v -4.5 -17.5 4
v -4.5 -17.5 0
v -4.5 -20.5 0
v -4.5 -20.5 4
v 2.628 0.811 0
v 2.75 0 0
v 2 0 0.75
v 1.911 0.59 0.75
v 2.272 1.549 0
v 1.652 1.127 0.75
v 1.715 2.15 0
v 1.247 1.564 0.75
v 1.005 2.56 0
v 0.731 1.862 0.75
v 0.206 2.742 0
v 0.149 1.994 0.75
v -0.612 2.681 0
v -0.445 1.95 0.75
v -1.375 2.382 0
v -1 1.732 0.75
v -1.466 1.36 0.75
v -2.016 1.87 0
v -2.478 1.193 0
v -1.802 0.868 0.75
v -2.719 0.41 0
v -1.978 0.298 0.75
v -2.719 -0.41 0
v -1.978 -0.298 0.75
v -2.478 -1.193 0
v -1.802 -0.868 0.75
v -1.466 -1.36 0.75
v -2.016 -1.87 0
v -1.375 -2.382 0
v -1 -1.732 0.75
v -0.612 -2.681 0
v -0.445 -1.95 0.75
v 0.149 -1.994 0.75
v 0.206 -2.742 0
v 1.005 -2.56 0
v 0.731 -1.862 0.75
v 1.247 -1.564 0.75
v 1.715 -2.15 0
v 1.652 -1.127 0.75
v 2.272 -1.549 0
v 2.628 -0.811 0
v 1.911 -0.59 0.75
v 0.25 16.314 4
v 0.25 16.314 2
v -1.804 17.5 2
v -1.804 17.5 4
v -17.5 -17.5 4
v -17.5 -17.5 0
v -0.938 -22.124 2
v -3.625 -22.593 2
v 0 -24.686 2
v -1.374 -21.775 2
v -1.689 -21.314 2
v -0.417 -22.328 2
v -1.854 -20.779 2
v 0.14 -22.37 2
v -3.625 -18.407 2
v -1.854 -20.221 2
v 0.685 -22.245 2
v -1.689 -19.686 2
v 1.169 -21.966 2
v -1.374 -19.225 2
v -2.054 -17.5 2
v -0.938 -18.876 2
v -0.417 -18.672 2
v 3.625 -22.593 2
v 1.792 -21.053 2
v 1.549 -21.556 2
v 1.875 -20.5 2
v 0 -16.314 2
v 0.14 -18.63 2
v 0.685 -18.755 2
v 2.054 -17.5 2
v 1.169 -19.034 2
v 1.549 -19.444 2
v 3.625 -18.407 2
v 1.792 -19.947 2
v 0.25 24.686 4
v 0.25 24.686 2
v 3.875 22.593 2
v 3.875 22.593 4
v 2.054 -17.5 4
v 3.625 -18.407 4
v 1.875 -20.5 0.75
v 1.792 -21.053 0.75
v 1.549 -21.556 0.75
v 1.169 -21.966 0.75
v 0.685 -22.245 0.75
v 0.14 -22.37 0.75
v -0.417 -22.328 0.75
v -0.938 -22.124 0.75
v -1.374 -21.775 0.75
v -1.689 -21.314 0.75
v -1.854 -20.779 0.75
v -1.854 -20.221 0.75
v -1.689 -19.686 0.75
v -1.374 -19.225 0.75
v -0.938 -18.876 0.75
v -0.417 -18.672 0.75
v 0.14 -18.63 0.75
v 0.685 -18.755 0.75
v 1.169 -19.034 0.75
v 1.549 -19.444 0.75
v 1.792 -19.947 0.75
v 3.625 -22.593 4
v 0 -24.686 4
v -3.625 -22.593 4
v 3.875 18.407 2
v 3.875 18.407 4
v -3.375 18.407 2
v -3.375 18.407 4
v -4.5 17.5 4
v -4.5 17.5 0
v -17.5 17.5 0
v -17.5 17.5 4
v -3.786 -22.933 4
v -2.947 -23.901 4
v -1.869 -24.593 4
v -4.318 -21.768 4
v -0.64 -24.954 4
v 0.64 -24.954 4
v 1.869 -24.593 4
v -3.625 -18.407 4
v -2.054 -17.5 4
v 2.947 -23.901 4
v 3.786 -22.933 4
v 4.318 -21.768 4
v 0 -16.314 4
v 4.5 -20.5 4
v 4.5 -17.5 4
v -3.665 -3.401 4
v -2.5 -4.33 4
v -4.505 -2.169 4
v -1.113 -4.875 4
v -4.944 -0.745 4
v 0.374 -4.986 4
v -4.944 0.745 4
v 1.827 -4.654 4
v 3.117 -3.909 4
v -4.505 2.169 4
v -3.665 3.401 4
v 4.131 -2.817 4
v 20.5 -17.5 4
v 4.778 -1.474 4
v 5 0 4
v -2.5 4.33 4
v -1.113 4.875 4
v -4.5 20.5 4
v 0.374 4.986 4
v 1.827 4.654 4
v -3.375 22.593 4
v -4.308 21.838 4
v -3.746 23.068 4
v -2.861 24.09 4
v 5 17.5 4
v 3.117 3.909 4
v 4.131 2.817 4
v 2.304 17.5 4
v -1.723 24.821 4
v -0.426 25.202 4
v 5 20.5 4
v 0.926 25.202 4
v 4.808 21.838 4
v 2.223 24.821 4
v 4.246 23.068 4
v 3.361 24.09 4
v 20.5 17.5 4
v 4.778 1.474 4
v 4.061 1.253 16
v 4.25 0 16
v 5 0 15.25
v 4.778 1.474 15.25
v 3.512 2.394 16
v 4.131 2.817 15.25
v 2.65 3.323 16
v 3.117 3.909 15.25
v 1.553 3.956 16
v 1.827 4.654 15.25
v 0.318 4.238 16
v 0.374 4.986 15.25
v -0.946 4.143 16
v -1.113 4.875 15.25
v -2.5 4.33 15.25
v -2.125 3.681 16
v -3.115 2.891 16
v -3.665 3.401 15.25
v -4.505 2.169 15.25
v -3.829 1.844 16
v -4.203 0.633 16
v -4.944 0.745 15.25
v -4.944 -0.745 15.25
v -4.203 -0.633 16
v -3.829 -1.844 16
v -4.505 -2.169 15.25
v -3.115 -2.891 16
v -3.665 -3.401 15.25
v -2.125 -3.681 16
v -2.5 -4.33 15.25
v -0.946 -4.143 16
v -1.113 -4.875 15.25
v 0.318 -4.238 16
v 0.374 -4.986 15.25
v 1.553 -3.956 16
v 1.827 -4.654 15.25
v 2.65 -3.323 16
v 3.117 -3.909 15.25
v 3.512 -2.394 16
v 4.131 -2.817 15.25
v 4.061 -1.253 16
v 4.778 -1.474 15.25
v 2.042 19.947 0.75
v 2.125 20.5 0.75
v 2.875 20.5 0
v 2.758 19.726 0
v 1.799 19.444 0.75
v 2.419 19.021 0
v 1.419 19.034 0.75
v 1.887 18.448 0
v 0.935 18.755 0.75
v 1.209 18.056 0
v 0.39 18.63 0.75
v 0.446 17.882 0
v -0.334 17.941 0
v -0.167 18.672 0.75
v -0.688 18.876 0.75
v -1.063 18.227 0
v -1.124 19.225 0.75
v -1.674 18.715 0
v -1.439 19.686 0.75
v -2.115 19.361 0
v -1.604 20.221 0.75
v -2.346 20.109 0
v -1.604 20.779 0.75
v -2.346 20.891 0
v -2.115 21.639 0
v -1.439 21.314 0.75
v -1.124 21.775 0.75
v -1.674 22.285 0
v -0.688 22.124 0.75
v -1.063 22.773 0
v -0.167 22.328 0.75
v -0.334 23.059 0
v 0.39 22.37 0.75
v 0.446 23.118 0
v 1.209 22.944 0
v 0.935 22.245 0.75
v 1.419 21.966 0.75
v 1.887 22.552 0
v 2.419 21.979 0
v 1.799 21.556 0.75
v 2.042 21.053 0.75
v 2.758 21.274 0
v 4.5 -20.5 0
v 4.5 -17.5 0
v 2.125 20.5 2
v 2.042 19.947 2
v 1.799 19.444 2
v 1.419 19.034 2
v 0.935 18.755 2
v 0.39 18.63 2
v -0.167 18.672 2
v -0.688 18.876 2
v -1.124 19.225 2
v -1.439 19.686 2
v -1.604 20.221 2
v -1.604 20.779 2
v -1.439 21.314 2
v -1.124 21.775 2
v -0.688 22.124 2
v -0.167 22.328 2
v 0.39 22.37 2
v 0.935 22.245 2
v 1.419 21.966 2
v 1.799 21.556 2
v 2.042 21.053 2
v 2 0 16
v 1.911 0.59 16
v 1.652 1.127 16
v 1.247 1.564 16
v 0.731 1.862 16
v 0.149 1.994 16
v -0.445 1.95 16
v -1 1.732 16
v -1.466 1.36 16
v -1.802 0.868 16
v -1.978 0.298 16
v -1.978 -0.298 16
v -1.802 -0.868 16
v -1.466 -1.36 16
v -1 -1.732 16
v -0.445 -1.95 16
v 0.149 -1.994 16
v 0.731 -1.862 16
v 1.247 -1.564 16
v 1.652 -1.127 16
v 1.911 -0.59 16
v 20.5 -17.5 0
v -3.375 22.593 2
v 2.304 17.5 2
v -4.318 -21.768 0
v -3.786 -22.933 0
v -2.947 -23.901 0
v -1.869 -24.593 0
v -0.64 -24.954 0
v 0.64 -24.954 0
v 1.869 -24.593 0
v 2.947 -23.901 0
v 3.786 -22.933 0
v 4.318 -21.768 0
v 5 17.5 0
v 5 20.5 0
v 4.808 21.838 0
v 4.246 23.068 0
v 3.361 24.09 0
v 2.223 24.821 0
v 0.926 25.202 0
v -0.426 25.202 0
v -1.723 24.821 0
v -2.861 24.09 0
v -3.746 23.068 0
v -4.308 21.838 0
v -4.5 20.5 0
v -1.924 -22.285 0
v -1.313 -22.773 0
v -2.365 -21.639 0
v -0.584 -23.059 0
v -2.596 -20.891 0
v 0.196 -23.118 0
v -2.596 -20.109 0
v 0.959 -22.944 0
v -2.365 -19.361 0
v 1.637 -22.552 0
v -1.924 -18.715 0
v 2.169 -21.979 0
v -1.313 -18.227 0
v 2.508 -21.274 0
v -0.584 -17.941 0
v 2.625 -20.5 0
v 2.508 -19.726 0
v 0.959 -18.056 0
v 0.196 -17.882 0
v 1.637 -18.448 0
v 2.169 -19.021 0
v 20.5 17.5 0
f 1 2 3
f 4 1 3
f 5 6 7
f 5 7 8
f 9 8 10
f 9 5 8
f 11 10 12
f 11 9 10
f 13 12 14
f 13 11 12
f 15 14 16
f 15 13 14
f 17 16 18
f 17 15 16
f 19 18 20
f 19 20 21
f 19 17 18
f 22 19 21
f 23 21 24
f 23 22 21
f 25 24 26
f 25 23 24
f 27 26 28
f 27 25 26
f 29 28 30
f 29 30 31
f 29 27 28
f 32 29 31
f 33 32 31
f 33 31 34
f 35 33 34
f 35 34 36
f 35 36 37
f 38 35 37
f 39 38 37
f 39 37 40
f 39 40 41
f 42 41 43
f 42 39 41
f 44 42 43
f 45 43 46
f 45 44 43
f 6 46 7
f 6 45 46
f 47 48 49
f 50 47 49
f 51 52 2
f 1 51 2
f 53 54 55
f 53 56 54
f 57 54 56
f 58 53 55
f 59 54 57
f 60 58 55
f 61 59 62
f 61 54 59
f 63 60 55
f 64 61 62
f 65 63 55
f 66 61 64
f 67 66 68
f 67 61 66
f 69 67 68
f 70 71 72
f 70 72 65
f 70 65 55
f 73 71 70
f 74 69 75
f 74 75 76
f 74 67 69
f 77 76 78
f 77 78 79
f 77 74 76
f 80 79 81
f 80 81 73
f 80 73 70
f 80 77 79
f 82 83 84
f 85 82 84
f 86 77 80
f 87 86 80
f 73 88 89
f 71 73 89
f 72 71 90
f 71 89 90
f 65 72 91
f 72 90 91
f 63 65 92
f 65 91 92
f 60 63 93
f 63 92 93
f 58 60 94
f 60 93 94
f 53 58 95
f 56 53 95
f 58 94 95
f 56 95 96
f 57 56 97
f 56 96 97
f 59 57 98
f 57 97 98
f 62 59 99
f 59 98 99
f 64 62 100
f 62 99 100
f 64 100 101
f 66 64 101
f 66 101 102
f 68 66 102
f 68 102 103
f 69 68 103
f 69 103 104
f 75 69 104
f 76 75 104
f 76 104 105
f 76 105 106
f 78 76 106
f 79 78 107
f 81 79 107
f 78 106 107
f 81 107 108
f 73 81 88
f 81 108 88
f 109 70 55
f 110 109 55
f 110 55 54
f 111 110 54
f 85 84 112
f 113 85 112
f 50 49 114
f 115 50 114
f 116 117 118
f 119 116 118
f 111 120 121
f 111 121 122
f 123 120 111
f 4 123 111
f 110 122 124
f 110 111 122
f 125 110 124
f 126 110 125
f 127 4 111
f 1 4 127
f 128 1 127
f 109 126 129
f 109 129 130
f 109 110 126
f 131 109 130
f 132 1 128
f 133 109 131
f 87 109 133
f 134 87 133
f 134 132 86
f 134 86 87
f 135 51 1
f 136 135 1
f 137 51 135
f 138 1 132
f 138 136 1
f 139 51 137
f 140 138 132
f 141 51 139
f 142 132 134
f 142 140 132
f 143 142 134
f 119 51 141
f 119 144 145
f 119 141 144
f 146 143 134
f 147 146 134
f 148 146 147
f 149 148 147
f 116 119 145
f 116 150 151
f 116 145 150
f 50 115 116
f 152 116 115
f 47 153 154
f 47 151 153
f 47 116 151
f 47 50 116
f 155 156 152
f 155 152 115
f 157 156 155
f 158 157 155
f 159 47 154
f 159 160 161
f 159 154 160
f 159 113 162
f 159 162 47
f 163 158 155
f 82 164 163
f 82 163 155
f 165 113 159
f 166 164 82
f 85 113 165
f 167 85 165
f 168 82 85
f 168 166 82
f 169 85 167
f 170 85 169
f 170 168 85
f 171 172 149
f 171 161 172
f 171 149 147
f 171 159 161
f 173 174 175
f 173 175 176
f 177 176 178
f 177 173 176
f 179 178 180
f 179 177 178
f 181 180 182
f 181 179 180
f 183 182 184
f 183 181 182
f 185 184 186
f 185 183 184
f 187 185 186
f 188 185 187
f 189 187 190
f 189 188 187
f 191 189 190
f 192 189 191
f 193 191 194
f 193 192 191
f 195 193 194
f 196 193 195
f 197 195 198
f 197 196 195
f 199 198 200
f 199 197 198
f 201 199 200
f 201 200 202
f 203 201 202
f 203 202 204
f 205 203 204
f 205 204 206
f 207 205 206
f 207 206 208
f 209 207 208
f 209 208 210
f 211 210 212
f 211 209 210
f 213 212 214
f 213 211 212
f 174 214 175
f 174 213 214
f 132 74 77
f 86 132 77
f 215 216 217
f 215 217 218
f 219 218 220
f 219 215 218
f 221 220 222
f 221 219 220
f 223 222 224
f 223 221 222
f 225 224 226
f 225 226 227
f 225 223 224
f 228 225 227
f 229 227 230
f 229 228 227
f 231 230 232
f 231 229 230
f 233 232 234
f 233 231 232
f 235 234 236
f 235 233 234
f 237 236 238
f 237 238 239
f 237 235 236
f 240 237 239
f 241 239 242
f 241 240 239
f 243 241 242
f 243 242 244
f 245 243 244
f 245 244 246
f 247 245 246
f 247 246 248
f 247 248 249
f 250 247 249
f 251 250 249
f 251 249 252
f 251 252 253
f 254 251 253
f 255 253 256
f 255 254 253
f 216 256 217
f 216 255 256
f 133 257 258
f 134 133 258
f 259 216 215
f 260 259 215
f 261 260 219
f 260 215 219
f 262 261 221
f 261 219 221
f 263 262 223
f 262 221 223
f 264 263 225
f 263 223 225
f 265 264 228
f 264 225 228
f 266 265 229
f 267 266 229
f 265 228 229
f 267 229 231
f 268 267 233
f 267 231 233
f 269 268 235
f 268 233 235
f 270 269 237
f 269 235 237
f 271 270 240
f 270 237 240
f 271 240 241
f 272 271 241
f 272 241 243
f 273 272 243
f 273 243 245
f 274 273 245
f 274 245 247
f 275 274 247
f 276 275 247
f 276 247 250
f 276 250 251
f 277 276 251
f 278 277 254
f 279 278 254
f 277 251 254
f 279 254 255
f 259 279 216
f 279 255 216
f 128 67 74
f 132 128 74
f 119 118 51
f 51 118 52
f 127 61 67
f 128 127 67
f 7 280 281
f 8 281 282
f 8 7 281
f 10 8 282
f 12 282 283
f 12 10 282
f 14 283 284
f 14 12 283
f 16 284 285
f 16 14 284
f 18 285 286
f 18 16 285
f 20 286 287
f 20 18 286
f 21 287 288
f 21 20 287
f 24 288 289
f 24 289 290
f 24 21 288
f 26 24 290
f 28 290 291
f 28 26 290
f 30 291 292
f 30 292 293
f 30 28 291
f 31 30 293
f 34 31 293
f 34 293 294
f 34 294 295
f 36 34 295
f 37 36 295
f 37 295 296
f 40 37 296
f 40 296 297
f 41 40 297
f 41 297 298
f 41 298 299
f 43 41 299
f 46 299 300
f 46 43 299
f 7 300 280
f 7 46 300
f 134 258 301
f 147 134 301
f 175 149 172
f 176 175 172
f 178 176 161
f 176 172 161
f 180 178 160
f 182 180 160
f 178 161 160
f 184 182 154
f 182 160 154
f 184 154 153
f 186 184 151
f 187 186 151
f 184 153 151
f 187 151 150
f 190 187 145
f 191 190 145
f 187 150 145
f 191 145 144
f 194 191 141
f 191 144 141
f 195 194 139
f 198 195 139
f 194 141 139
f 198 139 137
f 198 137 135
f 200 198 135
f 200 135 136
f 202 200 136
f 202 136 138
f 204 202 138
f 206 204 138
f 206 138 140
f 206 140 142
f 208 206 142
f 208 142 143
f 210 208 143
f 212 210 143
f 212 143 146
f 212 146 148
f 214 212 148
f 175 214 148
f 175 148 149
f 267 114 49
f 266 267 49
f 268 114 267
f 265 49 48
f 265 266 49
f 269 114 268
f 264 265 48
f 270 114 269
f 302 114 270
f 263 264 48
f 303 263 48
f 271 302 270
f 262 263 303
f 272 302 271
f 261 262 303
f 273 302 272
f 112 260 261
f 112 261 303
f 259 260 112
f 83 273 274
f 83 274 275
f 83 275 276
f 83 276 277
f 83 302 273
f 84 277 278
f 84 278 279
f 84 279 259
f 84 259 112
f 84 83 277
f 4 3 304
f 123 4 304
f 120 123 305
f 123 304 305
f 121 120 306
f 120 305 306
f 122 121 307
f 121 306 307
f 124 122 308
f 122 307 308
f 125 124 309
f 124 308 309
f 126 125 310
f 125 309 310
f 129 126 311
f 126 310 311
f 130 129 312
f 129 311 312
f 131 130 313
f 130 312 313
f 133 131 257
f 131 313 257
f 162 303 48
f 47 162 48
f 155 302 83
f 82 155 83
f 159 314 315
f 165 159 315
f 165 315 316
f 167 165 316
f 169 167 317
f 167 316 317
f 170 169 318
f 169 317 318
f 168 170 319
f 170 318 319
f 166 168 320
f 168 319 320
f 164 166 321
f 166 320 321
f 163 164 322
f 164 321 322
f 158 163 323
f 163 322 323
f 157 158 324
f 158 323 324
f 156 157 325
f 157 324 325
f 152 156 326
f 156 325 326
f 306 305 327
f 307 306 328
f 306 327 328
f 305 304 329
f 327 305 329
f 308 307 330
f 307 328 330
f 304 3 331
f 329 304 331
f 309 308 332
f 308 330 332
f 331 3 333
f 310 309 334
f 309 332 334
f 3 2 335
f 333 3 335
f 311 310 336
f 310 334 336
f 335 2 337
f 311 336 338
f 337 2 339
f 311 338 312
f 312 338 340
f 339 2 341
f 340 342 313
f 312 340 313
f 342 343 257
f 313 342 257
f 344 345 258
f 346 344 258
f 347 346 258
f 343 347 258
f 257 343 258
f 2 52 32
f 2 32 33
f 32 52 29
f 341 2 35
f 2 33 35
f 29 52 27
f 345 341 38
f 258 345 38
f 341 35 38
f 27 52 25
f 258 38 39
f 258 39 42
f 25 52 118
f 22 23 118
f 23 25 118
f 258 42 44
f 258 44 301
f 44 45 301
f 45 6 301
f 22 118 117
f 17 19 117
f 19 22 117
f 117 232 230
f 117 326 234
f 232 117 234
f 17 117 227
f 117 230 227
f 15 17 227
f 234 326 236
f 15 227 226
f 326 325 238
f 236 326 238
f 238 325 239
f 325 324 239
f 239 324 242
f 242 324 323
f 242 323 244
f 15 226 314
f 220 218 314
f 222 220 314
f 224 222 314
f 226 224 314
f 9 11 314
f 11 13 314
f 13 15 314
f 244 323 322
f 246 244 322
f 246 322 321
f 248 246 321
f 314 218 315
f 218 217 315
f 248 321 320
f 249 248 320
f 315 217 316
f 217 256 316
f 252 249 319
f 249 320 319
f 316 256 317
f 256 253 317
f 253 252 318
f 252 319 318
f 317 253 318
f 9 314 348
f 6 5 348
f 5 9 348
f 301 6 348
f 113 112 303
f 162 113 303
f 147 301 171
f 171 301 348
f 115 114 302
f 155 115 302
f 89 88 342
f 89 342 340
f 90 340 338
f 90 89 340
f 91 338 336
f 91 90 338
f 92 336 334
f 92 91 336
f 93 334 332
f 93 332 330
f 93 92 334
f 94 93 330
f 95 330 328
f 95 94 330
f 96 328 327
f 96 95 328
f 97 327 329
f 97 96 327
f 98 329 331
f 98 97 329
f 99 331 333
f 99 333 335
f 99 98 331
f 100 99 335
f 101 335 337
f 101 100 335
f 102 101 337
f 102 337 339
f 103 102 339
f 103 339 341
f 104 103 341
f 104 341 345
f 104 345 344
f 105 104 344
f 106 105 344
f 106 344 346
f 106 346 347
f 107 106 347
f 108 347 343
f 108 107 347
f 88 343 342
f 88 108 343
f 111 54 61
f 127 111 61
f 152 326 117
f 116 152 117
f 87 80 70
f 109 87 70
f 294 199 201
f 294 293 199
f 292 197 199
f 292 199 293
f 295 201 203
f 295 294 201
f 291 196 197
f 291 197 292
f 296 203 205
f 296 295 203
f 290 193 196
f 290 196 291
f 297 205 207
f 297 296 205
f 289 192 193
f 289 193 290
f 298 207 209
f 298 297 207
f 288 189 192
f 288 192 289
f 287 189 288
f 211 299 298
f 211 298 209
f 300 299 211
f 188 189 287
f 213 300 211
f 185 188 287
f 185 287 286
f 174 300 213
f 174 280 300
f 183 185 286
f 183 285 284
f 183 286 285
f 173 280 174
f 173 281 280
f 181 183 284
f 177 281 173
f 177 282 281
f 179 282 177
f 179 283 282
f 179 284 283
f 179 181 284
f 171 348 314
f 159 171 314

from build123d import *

# Parameters (mm, degrees)
F0_R     = 5
F1_DEPTH = 4
F2_DEPTH = 2
F0_R_2   = 2
F3_DEPTH = 16
F4_SIZE  = 0.75
F5_SIZE  = 0.75


with BuildPart() as f1:
    # F0 (on Top) → F1 (new body)
    with BuildSketch(Plane.XY):
        Polygon((-4.5, 20.5), (-4.5, 17.5), (-1.8038475773, 17.5), (-3.375, 18.4071052742), (-3.375, 20.5), align=None)
        Polygon((3.875, 18.4071052742), (2.3038475773, 17.5), (5, 17.5), (5, 20.5), (3.875, 20.5), align=None)
        with BuildLine():
            ThreePointArc((5, 20.5), (0.25, 25.25), (-4.5, 20.5))
            Line((-4.5, 20.5), (-3.375, 20.5))
            Line((-3.375, 20.5), (-3.375, 22.5928947258))
            Line((-3.375, 22.5928947258), (0.25, 24.6857894516))
            Line((0.25, 24.6857894516), (3.875, 22.5928947258))
            Line((3.875, 22.5928947258), (3.875, 20.5))
            Line((3.875, 20.5), (5, 20.5))
        make_face()
        Polygon((-4.5, 17.5), (-17.5, 17.5), (-17.5, -17.5), (-4.5, -17.5), (-2.0538475773, -17.5), (0, -16.3142105484), (2.0538475773, -17.5), (4.5, -17.5), (20.5, -17.5), (20.5, 17.5), (5, 17.5), (2.3038475773, 17.5), (0.25, 16.3142105484), (-1.8038475773, 17.5), align=None)
        Circle(F0_R, mode=Mode.SUBTRACT)
        Polygon((-2.0538475773, -17.5), (-4.5, -17.5), (-4.5, -20.5), (-3.625, -20.5), (-3.625, -18.4071052742), align=None)
        Polygon((4.5, -17.5), (2.0538475773, -17.5), (3.625, -18.4071052742), (3.625, -20.5), (4.5, -20.5), align=None)
        with BuildLine():
            Line((-3.625, -20.5), (-4.5, -20.5))
            ThreePointArc((-4.5, -20.5), (0, -25), (4.5, -20.5))
            Line((4.5, -20.5), (3.625, -20.5))
            Line((3.625, -20.5), (3.625, -22.5928947258))
            Line((3.625, -22.5928947258), (0, -24.6857894516))
            Line((0, -24.6857894516), (-3.625, -22.5928947258))
            Line((-3.625, -22.5928947258), (-3.625, -20.5))
        make_face()
    extrude(amount=F1_DEPTH)

    # F0 (on Top) → F2 (join)
    with BuildSketch(Plane.XY):
        with BuildLine():
            Line((-3.375, 22.5928947258), (-3.375, 20.5))
            Line((-3.375, 20.5), (-1.625, 20.5))
            ThreePointArc((-1.625, 20.5), (0.25, 22.375), (2.125, 20.5))
            Line((2.125, 20.5), (3.875, 20.5))
            Line((3.875, 20.5), (3.875, 22.5928947258))
            Line((3.875, 22.5928947258), (0.25, 24.6857894516))
            Line((0.25, 24.6857894516), (-3.375, 22.5928947258))
        make_face()
        with BuildLine():
            Line((-3.375, 18.4071052742), (-1.8038475773, 17.5))
            Line((-1.8038475773, 17.5), (2.3038475773, 17.5))
            Line((2.3038475773, 17.5), (3.875, 18.4071052742))
            Line((3.875, 18.4071052742), (3.875, 20.5))
            Line((3.875, 20.5), (2.125, 20.5))
            ThreePointArc((2.125, 20.5), (0.25, 18.625), (-1.625, 20.5))
            Line((-1.625, 20.5), (-3.375, 20.5))
            Line((-3.375, 20.5), (-3.375, 18.4071052742))
        make_face()
        Polygon((2.3038475773, 17.5), (-1.8038475773, 17.5), (0.25, 16.3142105484), align=None)
        Polygon((0, -16.3142105484), (-2.0538475773, -17.5), (2.0538475773, -17.5), align=None)
        with BuildLine():
            Line((2.0538475773, -17.5), (-2.0538475773, -17.5))
            Line((-2.0538475773, -17.5), (-3.625, -18.4071052742))
            Line((-3.625, -18.4071052742), (-3.625, -20.5))
            Line((-3.625, -20.5), (-1.875, -20.5))
            ThreePointArc((-1.875, -20.5), (0, -18.625), (1.875, -20.5))
            Line((1.875, -20.5), (3.625, -20.5))
            Line((3.625, -20.5), (3.625, -18.4071052742))
            Line((3.625, -18.4071052742), (2.0538475773, -17.5))
        make_face()
        with BuildLine():
            Line((-1.875, -20.5), (-3.625, -20.5))
            Line((-3.625, -20.5), (-3.625, -22.5928947258))
            Line((-3.625, -22.5928947258), (0, -24.6857894516))
            Line((0, -24.6857894516), (3.625, -22.5928947258))
            Line((3.625, -22.5928947258), (3.625, -20.5))
            Line((3.625, -20.5), (1.875, -20.5))
            ThreePointArc((1.875, -20.5), (0, -22.375), (-1.875, -20.5))
        make_face()
    extrude(amount=F2_DEPTH)

    # F0 (on Top) → F3 (join)
    with BuildSketch(Plane.XY):
        Circle(F0_R)
        Circle(F0_R_2, mode=Mode.SUBTRACT)
    extrude(amount=F3_DEPTH)

    # F4
    f4_edges = [f1.edges().sort_by_distance(p)[0] for p in [
        (-5, 0, 16),
    ]]
    chamfer(f4_edges, length=F4_SIZE)

    # F5
    f5_edges = [f1.edges().sort_by_distance(p)[0] for p in [
        (-1.875, -20.5, 0),
        (-1.625, 20.5, 0),
        (-2, 0, 0),
    ]]
    chamfer(f5_edges, length=F5_SIZE)


solid = f1.part
